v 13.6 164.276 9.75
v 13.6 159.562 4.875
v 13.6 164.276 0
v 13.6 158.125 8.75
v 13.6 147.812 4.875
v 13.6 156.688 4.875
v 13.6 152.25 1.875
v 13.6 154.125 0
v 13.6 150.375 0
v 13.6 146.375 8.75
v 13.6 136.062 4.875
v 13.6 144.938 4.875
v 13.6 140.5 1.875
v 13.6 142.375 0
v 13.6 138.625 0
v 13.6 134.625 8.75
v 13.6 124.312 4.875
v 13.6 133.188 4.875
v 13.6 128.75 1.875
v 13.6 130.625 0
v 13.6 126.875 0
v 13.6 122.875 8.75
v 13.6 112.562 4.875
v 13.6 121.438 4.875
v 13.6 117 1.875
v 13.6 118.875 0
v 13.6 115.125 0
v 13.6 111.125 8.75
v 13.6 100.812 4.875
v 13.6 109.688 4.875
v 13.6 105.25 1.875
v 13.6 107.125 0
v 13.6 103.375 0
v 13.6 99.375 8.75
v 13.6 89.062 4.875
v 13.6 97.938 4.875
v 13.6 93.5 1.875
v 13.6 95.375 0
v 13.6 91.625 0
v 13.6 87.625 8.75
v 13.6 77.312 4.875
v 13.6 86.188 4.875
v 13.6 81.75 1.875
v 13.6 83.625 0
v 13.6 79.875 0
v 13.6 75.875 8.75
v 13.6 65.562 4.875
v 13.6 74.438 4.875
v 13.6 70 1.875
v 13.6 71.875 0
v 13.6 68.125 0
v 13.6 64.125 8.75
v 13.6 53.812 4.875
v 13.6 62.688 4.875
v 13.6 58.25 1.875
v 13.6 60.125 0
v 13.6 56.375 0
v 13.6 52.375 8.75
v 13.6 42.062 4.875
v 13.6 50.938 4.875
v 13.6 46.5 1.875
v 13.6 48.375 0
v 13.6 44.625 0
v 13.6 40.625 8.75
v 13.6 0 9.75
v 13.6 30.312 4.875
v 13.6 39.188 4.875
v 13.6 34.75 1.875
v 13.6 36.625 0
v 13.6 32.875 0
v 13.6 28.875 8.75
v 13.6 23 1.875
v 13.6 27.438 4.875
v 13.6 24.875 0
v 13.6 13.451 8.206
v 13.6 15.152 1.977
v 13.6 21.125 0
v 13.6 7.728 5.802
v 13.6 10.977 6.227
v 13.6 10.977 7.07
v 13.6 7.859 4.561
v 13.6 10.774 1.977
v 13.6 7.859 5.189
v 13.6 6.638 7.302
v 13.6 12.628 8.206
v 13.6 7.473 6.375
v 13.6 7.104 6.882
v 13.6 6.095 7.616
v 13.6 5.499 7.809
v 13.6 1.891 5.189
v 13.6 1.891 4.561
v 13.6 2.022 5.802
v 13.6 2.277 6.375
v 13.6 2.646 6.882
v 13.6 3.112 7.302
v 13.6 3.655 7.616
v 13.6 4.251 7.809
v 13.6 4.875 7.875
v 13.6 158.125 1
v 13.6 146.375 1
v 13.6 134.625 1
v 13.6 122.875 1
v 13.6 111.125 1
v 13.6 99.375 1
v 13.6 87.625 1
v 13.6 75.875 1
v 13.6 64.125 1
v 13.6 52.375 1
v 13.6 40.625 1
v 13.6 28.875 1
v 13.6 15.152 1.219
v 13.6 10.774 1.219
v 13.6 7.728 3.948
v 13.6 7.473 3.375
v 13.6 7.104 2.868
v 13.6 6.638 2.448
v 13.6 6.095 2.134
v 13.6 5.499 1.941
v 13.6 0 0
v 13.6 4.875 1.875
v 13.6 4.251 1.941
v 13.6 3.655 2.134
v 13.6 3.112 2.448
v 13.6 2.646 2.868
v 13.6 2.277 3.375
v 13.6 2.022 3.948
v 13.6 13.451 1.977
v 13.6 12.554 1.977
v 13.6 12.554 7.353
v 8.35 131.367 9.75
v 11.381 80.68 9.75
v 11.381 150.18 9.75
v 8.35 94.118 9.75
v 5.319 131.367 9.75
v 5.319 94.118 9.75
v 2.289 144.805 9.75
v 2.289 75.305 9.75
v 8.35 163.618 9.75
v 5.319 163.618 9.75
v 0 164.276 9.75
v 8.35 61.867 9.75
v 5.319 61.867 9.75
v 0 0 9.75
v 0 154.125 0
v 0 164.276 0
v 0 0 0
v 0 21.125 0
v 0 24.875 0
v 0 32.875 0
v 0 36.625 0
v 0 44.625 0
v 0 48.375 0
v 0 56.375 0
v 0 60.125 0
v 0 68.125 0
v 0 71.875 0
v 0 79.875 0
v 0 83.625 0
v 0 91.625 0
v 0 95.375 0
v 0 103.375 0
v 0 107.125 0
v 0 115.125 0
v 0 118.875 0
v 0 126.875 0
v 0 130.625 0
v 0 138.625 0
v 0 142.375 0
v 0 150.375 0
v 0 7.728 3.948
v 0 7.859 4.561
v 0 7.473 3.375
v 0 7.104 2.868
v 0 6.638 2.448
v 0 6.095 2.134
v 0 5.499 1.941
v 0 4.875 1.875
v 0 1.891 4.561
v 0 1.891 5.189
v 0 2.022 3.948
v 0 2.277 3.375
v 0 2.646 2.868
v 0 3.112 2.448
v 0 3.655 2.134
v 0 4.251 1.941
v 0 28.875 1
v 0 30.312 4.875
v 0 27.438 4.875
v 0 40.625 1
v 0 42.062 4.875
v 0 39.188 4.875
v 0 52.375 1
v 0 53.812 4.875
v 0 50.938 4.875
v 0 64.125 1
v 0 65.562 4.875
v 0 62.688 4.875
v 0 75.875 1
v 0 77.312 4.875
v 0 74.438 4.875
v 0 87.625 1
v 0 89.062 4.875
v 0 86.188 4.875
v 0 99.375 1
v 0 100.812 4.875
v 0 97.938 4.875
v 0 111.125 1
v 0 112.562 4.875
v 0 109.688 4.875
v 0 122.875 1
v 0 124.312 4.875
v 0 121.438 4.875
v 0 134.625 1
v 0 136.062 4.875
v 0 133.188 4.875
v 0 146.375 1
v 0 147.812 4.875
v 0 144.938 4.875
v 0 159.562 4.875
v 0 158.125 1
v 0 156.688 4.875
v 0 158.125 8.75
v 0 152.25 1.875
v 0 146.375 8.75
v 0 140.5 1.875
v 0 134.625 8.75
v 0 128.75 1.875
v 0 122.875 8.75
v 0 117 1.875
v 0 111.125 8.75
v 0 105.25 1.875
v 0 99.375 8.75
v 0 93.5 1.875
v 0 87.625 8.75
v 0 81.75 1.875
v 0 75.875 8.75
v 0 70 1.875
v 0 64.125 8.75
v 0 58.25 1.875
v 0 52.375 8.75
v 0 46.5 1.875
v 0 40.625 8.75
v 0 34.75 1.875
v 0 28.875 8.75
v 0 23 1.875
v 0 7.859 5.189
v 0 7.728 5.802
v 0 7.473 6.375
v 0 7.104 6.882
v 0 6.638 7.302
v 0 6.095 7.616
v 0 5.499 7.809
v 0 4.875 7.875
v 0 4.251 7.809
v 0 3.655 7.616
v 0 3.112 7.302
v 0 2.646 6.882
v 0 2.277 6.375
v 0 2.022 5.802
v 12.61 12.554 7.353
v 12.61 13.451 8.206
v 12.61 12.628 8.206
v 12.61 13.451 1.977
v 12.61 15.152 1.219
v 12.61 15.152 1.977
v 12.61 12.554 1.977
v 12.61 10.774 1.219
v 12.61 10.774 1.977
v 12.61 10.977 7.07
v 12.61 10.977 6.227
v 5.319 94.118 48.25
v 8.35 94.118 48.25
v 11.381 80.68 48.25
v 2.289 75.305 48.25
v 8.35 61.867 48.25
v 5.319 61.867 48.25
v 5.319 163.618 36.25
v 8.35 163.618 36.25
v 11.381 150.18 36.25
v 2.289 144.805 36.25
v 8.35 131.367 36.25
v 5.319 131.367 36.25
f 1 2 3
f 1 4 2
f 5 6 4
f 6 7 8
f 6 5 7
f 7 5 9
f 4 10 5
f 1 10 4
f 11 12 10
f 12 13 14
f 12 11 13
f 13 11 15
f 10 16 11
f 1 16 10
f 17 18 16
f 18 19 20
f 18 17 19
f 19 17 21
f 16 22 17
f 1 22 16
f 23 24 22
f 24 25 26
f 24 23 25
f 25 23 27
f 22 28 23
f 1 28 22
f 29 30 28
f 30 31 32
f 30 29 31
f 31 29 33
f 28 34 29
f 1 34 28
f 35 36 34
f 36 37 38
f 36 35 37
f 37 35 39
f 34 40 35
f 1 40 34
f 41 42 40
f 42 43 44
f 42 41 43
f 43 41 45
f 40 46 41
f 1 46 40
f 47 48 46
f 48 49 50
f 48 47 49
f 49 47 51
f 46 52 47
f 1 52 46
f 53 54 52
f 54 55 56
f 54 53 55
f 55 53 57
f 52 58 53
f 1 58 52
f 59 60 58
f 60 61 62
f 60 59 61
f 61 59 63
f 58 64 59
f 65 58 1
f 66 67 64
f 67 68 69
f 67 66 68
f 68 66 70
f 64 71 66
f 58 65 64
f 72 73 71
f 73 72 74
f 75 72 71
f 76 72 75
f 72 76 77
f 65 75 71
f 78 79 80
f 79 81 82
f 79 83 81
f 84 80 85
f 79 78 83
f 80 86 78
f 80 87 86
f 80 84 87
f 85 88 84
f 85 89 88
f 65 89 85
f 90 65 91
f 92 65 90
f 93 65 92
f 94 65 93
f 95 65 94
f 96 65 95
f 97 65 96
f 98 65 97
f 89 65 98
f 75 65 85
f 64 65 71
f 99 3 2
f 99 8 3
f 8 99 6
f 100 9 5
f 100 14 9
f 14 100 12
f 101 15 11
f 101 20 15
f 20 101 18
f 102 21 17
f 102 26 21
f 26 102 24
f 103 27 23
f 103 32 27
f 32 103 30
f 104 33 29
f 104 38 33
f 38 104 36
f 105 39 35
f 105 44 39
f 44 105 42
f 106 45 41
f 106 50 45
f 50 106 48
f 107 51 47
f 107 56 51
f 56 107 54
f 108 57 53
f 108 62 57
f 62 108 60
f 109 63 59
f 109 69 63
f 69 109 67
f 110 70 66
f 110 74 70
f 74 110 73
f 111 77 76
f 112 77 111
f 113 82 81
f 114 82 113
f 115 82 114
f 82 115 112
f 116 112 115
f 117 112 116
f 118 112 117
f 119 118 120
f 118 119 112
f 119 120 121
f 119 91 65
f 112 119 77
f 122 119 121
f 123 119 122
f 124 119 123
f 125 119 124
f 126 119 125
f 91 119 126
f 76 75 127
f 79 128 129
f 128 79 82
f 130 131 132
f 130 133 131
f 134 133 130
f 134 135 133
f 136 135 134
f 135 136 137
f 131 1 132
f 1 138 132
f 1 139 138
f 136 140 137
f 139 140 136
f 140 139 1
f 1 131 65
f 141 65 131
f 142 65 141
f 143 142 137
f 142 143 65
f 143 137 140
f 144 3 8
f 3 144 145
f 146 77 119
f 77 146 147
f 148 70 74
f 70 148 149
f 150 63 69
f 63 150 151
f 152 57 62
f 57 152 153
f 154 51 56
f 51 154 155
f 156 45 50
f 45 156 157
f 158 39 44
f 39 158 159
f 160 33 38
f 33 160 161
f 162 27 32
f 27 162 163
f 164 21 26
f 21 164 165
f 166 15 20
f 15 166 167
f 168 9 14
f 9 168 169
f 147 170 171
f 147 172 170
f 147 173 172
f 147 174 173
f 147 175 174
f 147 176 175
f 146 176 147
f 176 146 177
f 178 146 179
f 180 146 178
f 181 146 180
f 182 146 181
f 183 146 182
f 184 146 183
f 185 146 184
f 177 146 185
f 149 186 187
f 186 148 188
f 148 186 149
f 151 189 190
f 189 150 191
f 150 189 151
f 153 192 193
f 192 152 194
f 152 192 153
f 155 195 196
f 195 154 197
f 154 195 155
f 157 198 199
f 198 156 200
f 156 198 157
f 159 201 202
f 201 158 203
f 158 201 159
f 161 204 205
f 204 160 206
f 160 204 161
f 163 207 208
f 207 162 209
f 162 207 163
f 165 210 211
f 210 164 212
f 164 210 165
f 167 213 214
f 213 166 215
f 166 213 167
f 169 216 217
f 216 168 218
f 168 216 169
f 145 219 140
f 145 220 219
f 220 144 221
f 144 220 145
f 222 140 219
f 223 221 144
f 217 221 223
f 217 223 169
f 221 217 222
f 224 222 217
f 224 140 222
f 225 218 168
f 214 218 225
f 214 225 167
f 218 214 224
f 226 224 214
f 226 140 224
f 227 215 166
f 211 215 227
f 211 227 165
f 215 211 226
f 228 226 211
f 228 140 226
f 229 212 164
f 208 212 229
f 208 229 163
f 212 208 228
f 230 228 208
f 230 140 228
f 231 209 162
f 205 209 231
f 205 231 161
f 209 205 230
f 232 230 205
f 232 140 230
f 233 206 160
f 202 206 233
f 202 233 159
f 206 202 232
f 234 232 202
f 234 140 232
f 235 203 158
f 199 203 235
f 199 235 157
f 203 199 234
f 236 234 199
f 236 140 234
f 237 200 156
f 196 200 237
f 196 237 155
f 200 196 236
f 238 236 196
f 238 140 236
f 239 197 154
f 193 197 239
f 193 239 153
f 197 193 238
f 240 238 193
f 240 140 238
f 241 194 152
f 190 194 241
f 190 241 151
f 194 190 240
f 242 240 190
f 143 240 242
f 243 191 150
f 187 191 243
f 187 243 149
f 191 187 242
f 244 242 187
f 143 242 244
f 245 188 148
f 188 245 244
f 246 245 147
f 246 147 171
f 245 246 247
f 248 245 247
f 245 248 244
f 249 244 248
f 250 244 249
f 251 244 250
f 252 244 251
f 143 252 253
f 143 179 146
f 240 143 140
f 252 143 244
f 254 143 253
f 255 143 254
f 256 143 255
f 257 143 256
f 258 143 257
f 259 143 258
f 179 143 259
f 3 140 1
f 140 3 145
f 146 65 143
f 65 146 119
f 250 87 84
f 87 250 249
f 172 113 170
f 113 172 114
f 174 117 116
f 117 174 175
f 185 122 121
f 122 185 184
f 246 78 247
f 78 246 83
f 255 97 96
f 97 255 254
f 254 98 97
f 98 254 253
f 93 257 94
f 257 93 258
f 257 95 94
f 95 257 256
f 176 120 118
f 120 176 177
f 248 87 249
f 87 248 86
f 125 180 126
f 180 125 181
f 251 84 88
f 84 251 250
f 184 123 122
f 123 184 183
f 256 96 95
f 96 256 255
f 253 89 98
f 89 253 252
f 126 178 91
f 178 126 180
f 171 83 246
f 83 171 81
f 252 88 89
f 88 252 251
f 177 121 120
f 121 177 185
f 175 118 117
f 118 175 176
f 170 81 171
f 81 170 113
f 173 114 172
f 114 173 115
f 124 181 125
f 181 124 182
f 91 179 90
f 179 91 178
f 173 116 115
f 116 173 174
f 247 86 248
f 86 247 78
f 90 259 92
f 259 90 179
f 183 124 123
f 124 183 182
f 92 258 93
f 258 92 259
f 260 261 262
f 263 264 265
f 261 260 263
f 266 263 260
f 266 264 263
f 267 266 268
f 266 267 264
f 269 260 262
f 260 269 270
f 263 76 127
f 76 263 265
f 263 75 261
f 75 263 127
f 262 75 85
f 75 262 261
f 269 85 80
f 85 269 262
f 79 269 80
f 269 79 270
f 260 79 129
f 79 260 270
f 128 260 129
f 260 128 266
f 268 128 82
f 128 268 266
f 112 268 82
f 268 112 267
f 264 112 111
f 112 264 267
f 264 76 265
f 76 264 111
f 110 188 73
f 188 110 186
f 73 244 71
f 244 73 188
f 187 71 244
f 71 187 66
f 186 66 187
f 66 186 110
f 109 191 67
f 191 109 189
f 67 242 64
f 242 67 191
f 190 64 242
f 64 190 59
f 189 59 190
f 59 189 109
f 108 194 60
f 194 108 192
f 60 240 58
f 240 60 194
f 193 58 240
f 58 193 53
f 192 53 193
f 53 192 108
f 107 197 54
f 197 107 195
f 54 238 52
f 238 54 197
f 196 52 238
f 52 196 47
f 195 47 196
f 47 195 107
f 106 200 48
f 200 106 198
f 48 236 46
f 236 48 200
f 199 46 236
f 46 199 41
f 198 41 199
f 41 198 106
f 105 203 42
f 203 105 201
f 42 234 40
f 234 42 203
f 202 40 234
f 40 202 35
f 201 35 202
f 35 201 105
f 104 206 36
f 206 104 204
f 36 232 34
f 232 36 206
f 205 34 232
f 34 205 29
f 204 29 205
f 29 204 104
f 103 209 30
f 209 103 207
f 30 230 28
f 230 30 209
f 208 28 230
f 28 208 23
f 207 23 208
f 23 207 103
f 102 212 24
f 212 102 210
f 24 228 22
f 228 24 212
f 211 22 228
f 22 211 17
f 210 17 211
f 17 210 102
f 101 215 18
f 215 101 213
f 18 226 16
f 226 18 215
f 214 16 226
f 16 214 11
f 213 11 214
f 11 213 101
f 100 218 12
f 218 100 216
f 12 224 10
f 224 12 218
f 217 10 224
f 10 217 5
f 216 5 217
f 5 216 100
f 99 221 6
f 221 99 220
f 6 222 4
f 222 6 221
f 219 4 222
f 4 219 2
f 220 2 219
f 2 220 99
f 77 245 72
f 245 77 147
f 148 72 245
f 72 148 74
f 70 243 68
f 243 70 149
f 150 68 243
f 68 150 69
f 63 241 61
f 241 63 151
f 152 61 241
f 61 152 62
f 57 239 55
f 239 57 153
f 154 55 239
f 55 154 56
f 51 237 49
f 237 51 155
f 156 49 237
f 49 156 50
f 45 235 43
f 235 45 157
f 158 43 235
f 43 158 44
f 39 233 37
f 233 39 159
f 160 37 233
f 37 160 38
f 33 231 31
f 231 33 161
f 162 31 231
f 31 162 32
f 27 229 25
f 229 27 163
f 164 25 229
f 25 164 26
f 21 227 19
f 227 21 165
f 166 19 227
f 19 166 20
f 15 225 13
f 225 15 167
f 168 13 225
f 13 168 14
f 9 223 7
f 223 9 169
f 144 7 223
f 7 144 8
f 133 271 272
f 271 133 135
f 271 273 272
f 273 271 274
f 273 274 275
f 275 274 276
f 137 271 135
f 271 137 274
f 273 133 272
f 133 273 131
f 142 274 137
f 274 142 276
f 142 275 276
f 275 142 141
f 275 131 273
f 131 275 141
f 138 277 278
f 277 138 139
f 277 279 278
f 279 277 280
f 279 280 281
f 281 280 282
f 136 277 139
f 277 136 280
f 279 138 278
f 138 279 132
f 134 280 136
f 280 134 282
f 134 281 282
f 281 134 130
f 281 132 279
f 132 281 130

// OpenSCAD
// file: values.scad
$fs=0.1;
//Constants:
edgeRadius=1.5;
underKeyWidth=13.6;
baseHeight=9.75;
genh=5.791666666666667;
a=27.423996629776394;
b=12.370392724366756;
c=12.370392724366756;
d=38.393595281686956;
overhead=65.81759191146335;
keyTravelDistance=13.0;
desiredGamut=24;
shift=3.092598181091689;
holeScale=0.5;
stalkScale=0.48;

Points = [
[shift,a,0],//0
[(b-shift),0,0],//1
[(b+shift),0,0],//2
[(b+c-shift),d,0],//3
[(c+shift),(a+d),0],//4
[(c-shift),(a+d),0],//5
[shift,a,keyTravelDistance],//6
[(b-shift),0,keyTravelDistance],//7
[(b+shift),0,keyTravelDistance],//8
[(b+c-shift),d,keyTravelDistance],//9
[(c+shift),(a+d),keyTravelDistance],//10
[(c-shift),(a+d),keyTravelDistance],//11
];
Faces = [
[0,1,2,3,4,5],
[1,0,6,7],
[2,1,7,8],
[3,2,8,9],
[4,3,9,10],
[5,4,10,11],
[0,5,11,6],
[11,10,9,8,7,6] 
];
// file: keytop.scad
include<values.scad>;
keytop();

module keytopShape(){
polyhedron(Points,Faces);
}
module keytop(){
difference(){
keytopShape();
translate([(b+c)/4,(d+a)/4,-0.1])
scale(holeScale,holeScale,holeScale)
keytopShape();
edge(6,11,1,-1);
edge(6,7,1,1);
edge(7,8,1,1);
edge(8,9,1,1);
edge(9,10,1,-1,-1);
edge(10,11,1,-1);
}
module edge (point1,point2,d1,d2,d3=1){
difference(){
translate([Points[point1][0],Points[point1][1],Points[point1][2]])
rotate([0,90,atan((Points[point2][1]-Points[point1][1])/(Points[point2][0]-Points[point1][0]))])
translate([0,0,d3*30])
rotate(45,0,0)
cube([pow(2*(edgeRadius*edgeRadius),1/2),pow(2*(edgeRadius*edgeRadius),1/2),90],true);
translate([Points[point1][0],Points[point1][1],Points[point1][2]])
rotate([0,90,atan((Points[point2][1]-Points[point1][1])/(Points[point2][0]-Points[point1][0]))])
translate([d1*edgeRadius,d2*edgeRadius,d3*30])
cylinder(90,edgeRadius,edgeRadius, true);
}
}

}
// main file
use<keytop.scad>
include<values.scad>
rotate([0,90,0])1_5();
module 1_5(keytops=false){
length=164.2759252447967;
rotate([0,-90,0]){
//Main Base:
difference(){
cube([underKeyWidth,length,baseHeight],false);
translate([-.1,0.5*baseHeight,0.5*baseHeight])rotate([0,90,0])
cylinder((underKeyWidth+.2),r=3, false);
translate([underKeyWidth-.99,10,0.125*baseHeight])
rotate([90,0,90])
linear_extrude(height=1){
text("1",size=baseHeight*0.75);
}

//Warp Cuts:
translate([-1,0.0+25+0.25*baseHeight,baseHeight-1])
rotate([0,90,0])
linear_extrude(height=underKeyWidth+2)
polygon(points=[[0.5*baseHeight-1,0],[baseHeight-2,0.25*baseHeight-1],[0.5*baseHeight-1,0.5*baseHeight-2],[0,0.25*baseHeight-1]]);
translate([-1,11.75+25+0.25*baseHeight,baseHeight-1])
rotate([0,90,0])
linear_extrude(height=underKeyWidth+2)
polygon(points=[[0.5*baseHeight-1,0],[baseHeight-2,0.25*baseHeight-1],[0.5*baseHeight-1,0.5*baseHeight-2],[0,0.25*baseHeight-1]]);
translate([-1,23.5+25+0.25*baseHeight,baseHeight-1])
rotate([0,90,0])
linear_extrude(height=underKeyWidth+2)
polygon(points=[[0.5*baseHeight-1,0],[baseHeight-2,0.25*baseHeight-1],[0.5*baseHeight-1,0.5*baseHeight-2],[0,0.25*baseHeight-1]]);
translate([-1,35.25+25+0.25*baseHeight,baseHeight-1])
rotate([0,90,0])
linear_extrude(height=underKeyWidth+2)
polygon(points=[[0.5*baseHeight-1,0],[baseHeight-2,0.25*baseHeight-1],[0.5*baseHeight-1,0.5*baseHeight-2],[0,0.25*baseHeight-1]]);
translate([-1,47.0+25+0.25*baseHeight,baseHeight-1])
rotate([0,90,0])
linear_extrude(height=underKeyWidth+2)
polygon(points=[[0.5*baseHeight-1,0],[baseHeight-2,0.25*baseHeight-1],[0.5*baseHeight-1,0.5*baseHeight-2],[0,0.25*baseHeight-1]]);
translate([-1,58.75+25+0.25*baseHeight,baseHeight-1])
rotate([0,90,0])
linear_extrude(height=underKeyWidth+2)
polygon(points=[[0.5*baseHeight-1,0],[baseHeight-2,0.25*baseHeight-1],[0.5*baseHeight-1,0.5*baseHeight-2],[0,0.25*baseHeight-1]]);
translate([-1,70.5+25+0.25*baseHeight,baseHeight-1])
rotate([0,90,0])
linear_extrude(height=underKeyWidth+2)
polygon(points=[[0.5*baseHeight-1,0],[baseHeight-2,0.25*baseHeight-1],[0.5*baseHeight-1,0.5*baseHeight-2],[0,0.25*baseHeight-1]]);
translate([-1,82.25+25+0.25*baseHeight,baseHeight-1])
rotate([0,90,0])
linear_extrude(height=underKeyWidth+2)
polygon(points=[[0.5*baseHeight-1,0],[baseHeight-2,0.25*baseHeight-1],[0.5*baseHeight-1,0.5*baseHeight-2],[0,0.25*baseHeight-1]]);
translate([-1,94.0+25+0.25*baseHeight,baseHeight-1])
rotate([0,90,0])
linear_extrude(height=underKeyWidth+2)
polygon(points=[[0.5*baseHeight-1,0],[baseHeight-2,0.25*baseHeight-1],[0.5*baseHeight-1,0.5*baseHeight-2],[0,0.25*baseHeight-1]]);
translate([-1,105.75+25+0.25*baseHeight,baseHeight-1])
rotate([0,90,0])
linear_extrude(height=underKeyWidth+2)
polygon(points=[[0.5*baseHeight-1,0],[baseHeight-2,0.25*baseHeight-1],[0.5*baseHeight-1,0.5*baseHeight-2],[0,0.25*baseHeight-1]]);
translate([-1,117.5+25+0.25*baseHeight,baseHeight-1])
rotate([0,90,0])
linear_extrude(height=underKeyWidth+2)
polygon(points=[[0.5*baseHeight-1,0],[baseHeight-2,0.25*baseHeight-1],[0.5*baseHeight-1,0.5*baseHeight-2],[0,0.25*baseHeight-1]]);
translate([-1,129.25+25+0.25*baseHeight,baseHeight-1])
rotate([0,90,0])
linear_extrude(height=underKeyWidth+2)
polygon(points=[[0.5*baseHeight-1,0],[baseHeight-2,0.25*baseHeight-1],[0.5*baseHeight-1,0.5*baseHeight-2],[0,0.25*baseHeight-1]]);
translate([-1,0.0+25-0.5*baseHeight-1,0.5*baseHeight-3])
rotate([0,90,0])
linear_extrude(height=underKeyWidth+2)
polygon(points=[[0.5*baseHeight-1,0],[baseHeight-2,0.5*baseHeight-1],[0.5*baseHeight-1,baseHeight-2],[0,0.5*baseHeight-1]]);
translate([-1,11.75+25-0.5*baseHeight-1,0.5*baseHeight-3])
rotate([0,90,0])
linear_extrude(height=underKeyWidth+2)
polygon(points=[[0.5*baseHeight-1,0],[baseHeight-2,0.5*baseHeight-1],[0.5*baseHeight-1,baseHeight-2],[0,0.5*baseHeight-1]]);
translate([-1,23.5+25-0.5*baseHeight-1,0.5*baseHeight-3])
rotate([0,90,0])
linear_extrude(height=underKeyWidth+2)
polygon(points=[[0.5*baseHeight-1,0],[baseHeight-2,0.5*baseHeight-1],[0.5*baseHeight-1,baseHeight-2],[0,0.5*baseHeight-1]]);
translate([-1,35.25+25-0.5*baseHeight-1,0.5*baseHeight-3])
rotate([0,90,0])
linear_extrude(height=underKeyWidth+2)
polygon(points=[[0.5*baseHeight-1,0],[baseHeight-2,0.5*baseHeight-1],[0.5*baseHeight-1,baseHeight-2],[0,0.5*baseHeight-1]]);
translate([-1,47.0+25-0.5*baseHeight-1,0.5*baseHeight-3])
rotate([0,90,0])
linear_extrude(height=underKeyWidth+2)
polygon(points=[[0.5*baseHeight-1,0],[baseHeight-2,0.5*baseHeight-1],[0.5*baseHeight-1,baseHeight-2],[0,0.5*baseHeight-1]]);
translate([-1,58.75+25-0.5*baseHeight-1,0.5*baseHeight-3])
rotate([0,90,0])
linear_extrude(height=underKeyWidth+2)
polygon(points=[[0.5*baseHeight-1,0],[baseHeight-2,0.5*baseHeight-1],[0.5*baseHeight-1,baseHeight-2],[0,0.5*baseHeight-1]]);
translate([-1,70.5+25-0.5*baseHeight-1,0.5*baseHeight-3])
rotate([0,90,0])
linear_extrude(height=underKeyWidth+2)
polygon(points=[[0.5*baseHeight-1,0],[baseHeight-2,0.5*baseHeight-1],[0.5*baseHeight-1,baseHeight-2],[0,0.5*baseHeight-1]]);
translate([-1,82.25+25-0.5*baseHeight-1,0.5*baseHeight-3])
rotate([0,90,0])
linear_extrude(height=underKeyWidth+2)
polygon(points=[[0.5*baseHeight-1,0],[baseHeight-2,0.5*baseHeight-1],[0.5*baseHeight-1,baseHeight-2],[0,0.5*baseHeight-1]]);
translate([-1,94.0+25-0.5*baseHeight-1,0.5*baseHeight-3])
rotate([0,90,0])
linear_extrude(height=underKeyWidth+2)
polygon(points=[[0.5*baseHeight-1,0],[baseHeight-2,0.5*baseHeight-1],[0.5*baseHeight-1,baseHeight-2],[0,0.5*baseHeight-1]]);
translate([-1,105.75+25-0.5*baseHeight-1,0.5*baseHeight-3])
rotate([0,90,0])
linear_extrude(height=underKeyWidth+2)
polygon(points=[[0.5*baseHeight-1,0],[baseHeight-2,0.5*baseHeight-1],[0.5*baseHeight-1,baseHeight-2],[0,0.5*baseHeight-1]]);
translate([-1,117.5+25-0.5*baseHeight-1,0.5*baseHeight-3])
rotate([0,90,0])
linear_extrude(height=underKeyWidth+2)
polygon(points=[[0.5*baseHeight-1,0],[baseHeight-2,0.5*baseHeight-1],[0.5*baseHeight-1,baseHeight-2],[0,0.5*baseHeight-1]]);
translate([-1,129.25+25-0.5*baseHeight-1,0.5*baseHeight-3])
rotate([0,90,0])
linear_extrude(height=underKeyWidth+2)
polygon(points=[[0.5*baseHeight-1,0],[baseHeight-2,0.5*baseHeight-1],[0.5*baseHeight-1,baseHeight-2],[0,0.5*baseHeight-1]]);
}
//Key Stalks:
translate([shift/4,(genh*5-(d+a)/2+overhead),baseHeight]){
linear_extrude(height=(keyTravelDistance*1.5+desiredGamut-5)){
scale((stalkScale+holeScale)/2,stalkScale)
polygon(points=[
[Points[0][0],Points[0][1]],[Points[1][0],Points[1][1]],[Points[2][0],Points[2][1]],[Points[3][0],Points[3][1]],[Points[4][0],Points[4][1]],[Points[5][0],Points[5][1]],[Points[6][0],Points[6][1]]
]);
}
if(keytops)
translate([0,(-0.5*(a+d)),(keyTravelDistance*1.5+desiredGamut-5+40)])
keytop();
}
translate([shift/4,(genh*17-(d+a)/2+overhead),baseHeight]){
linear_extrude(height=(keyTravelDistance*1.5+desiredGamut-17)){
scale((stalkScale+holeScale)/2,stalkScale)
polygon(points=[
[Points[0][0],Points[0][1]],[Points[1][0],Points[1][1]],[Points[2][0],Points[2][1]],[Points[3][0],Points[3][1]],[Points[4][0],Points[4][1]],[Points[5][0],Points[5][1]],[Points[6][0],Points[6][1]]
]);
}
if(keytops)
translate([0,(-0.5*(a+d)),(keyTravelDistance*1.5+desiredGamut-17+40)])
keytop();
}
}}
